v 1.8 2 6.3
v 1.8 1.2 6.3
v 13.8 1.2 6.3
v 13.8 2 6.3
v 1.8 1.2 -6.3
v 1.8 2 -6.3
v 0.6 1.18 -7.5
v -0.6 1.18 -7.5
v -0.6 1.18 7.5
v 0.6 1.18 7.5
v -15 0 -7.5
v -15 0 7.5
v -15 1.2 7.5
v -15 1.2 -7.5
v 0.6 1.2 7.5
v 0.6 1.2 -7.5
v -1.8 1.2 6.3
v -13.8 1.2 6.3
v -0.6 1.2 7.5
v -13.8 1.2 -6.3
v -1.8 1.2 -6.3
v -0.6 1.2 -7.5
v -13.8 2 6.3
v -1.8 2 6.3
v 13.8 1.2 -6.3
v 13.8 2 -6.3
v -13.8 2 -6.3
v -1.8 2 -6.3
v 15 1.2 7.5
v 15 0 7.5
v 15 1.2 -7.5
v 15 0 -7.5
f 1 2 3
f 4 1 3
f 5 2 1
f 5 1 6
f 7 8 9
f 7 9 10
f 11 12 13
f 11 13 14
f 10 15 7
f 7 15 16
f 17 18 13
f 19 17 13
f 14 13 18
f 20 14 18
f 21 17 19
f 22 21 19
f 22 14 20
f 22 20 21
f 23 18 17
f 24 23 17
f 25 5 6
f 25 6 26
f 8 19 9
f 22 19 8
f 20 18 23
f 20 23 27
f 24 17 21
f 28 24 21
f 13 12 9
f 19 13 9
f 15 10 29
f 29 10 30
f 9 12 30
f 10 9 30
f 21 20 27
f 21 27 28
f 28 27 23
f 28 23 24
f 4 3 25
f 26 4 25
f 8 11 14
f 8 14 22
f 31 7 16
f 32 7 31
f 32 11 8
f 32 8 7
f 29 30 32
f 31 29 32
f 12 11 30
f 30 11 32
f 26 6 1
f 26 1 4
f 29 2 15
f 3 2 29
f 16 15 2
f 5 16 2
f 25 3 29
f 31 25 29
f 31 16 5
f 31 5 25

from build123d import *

# Parameters (mm, degrees)
SKETCH1_W           = 30
SKETCH1_H           = 15
BOSS_EXTRUDE1_DEPTH = 1.2
SKETCH2_W           = 1.2
SKETCH2_H           = 15
CUT_EXTRUDE1_DEPTH  = 0.02
SKETCH3_W           = 12
SKETCH3_H           = 12.6
BOSS_EXTRUDE2_DEPTH = 0.8
SKETCH4_W           = 12
SKETCH4_H           = 12.6
BOSS_EXTRUDE3_DEPTH = 0.8


with BuildPart() as part:
    # Sketch1 → Boss-Extrude1 (new body)
    with BuildSketch(Plane(origin=(0, 0, 0), x_dir=(1, 0, 0), z_dir=(0, 1, 0))):
        Rectangle(SKETCH1_W, SKETCH1_H)
    extrude(amount=BOSS_EXTRUDE1_DEPTH)

    # Sketch2 → Cut-Extrude1 (cut)
    with BuildSketch(Plane(origin=(0, 1.2, 0), x_dir=(1, 0, 0), z_dir=(0, 1, 0))):
        Rectangle(SKETCH2_W, SKETCH2_H)
    extrude(amount=-CUT_EXTRUDE1_DEPTH, mode=Mode.SUBTRACT)

    # Sketch3 → Boss-Extrude2 (add)
    with BuildSketch(Plane(origin=(0, 1.2, 0), x_dir=(1, 0, 0), z_dir=(0, 1, 0))):
        with Locations((-7.8, 0)):
            Rectangle(SKETCH3_W, SKETCH3_H)
    extrude(amount=BOSS_EXTRUDE2_DEPTH)

    # Sketch4 → Boss-Extrude3 (add)
    with BuildSketch(Plane(origin=(0, 1.2, 0), x_dir=(1, 0, 0), z_dir=(0, 1, 0))):
        with Locations((7.8, 0)):
            Rectangle(SKETCH4_W, SKETCH4_H)
    extrude(amount=BOSS_EXTRUDE3_DEPTH)


solid = part.part
